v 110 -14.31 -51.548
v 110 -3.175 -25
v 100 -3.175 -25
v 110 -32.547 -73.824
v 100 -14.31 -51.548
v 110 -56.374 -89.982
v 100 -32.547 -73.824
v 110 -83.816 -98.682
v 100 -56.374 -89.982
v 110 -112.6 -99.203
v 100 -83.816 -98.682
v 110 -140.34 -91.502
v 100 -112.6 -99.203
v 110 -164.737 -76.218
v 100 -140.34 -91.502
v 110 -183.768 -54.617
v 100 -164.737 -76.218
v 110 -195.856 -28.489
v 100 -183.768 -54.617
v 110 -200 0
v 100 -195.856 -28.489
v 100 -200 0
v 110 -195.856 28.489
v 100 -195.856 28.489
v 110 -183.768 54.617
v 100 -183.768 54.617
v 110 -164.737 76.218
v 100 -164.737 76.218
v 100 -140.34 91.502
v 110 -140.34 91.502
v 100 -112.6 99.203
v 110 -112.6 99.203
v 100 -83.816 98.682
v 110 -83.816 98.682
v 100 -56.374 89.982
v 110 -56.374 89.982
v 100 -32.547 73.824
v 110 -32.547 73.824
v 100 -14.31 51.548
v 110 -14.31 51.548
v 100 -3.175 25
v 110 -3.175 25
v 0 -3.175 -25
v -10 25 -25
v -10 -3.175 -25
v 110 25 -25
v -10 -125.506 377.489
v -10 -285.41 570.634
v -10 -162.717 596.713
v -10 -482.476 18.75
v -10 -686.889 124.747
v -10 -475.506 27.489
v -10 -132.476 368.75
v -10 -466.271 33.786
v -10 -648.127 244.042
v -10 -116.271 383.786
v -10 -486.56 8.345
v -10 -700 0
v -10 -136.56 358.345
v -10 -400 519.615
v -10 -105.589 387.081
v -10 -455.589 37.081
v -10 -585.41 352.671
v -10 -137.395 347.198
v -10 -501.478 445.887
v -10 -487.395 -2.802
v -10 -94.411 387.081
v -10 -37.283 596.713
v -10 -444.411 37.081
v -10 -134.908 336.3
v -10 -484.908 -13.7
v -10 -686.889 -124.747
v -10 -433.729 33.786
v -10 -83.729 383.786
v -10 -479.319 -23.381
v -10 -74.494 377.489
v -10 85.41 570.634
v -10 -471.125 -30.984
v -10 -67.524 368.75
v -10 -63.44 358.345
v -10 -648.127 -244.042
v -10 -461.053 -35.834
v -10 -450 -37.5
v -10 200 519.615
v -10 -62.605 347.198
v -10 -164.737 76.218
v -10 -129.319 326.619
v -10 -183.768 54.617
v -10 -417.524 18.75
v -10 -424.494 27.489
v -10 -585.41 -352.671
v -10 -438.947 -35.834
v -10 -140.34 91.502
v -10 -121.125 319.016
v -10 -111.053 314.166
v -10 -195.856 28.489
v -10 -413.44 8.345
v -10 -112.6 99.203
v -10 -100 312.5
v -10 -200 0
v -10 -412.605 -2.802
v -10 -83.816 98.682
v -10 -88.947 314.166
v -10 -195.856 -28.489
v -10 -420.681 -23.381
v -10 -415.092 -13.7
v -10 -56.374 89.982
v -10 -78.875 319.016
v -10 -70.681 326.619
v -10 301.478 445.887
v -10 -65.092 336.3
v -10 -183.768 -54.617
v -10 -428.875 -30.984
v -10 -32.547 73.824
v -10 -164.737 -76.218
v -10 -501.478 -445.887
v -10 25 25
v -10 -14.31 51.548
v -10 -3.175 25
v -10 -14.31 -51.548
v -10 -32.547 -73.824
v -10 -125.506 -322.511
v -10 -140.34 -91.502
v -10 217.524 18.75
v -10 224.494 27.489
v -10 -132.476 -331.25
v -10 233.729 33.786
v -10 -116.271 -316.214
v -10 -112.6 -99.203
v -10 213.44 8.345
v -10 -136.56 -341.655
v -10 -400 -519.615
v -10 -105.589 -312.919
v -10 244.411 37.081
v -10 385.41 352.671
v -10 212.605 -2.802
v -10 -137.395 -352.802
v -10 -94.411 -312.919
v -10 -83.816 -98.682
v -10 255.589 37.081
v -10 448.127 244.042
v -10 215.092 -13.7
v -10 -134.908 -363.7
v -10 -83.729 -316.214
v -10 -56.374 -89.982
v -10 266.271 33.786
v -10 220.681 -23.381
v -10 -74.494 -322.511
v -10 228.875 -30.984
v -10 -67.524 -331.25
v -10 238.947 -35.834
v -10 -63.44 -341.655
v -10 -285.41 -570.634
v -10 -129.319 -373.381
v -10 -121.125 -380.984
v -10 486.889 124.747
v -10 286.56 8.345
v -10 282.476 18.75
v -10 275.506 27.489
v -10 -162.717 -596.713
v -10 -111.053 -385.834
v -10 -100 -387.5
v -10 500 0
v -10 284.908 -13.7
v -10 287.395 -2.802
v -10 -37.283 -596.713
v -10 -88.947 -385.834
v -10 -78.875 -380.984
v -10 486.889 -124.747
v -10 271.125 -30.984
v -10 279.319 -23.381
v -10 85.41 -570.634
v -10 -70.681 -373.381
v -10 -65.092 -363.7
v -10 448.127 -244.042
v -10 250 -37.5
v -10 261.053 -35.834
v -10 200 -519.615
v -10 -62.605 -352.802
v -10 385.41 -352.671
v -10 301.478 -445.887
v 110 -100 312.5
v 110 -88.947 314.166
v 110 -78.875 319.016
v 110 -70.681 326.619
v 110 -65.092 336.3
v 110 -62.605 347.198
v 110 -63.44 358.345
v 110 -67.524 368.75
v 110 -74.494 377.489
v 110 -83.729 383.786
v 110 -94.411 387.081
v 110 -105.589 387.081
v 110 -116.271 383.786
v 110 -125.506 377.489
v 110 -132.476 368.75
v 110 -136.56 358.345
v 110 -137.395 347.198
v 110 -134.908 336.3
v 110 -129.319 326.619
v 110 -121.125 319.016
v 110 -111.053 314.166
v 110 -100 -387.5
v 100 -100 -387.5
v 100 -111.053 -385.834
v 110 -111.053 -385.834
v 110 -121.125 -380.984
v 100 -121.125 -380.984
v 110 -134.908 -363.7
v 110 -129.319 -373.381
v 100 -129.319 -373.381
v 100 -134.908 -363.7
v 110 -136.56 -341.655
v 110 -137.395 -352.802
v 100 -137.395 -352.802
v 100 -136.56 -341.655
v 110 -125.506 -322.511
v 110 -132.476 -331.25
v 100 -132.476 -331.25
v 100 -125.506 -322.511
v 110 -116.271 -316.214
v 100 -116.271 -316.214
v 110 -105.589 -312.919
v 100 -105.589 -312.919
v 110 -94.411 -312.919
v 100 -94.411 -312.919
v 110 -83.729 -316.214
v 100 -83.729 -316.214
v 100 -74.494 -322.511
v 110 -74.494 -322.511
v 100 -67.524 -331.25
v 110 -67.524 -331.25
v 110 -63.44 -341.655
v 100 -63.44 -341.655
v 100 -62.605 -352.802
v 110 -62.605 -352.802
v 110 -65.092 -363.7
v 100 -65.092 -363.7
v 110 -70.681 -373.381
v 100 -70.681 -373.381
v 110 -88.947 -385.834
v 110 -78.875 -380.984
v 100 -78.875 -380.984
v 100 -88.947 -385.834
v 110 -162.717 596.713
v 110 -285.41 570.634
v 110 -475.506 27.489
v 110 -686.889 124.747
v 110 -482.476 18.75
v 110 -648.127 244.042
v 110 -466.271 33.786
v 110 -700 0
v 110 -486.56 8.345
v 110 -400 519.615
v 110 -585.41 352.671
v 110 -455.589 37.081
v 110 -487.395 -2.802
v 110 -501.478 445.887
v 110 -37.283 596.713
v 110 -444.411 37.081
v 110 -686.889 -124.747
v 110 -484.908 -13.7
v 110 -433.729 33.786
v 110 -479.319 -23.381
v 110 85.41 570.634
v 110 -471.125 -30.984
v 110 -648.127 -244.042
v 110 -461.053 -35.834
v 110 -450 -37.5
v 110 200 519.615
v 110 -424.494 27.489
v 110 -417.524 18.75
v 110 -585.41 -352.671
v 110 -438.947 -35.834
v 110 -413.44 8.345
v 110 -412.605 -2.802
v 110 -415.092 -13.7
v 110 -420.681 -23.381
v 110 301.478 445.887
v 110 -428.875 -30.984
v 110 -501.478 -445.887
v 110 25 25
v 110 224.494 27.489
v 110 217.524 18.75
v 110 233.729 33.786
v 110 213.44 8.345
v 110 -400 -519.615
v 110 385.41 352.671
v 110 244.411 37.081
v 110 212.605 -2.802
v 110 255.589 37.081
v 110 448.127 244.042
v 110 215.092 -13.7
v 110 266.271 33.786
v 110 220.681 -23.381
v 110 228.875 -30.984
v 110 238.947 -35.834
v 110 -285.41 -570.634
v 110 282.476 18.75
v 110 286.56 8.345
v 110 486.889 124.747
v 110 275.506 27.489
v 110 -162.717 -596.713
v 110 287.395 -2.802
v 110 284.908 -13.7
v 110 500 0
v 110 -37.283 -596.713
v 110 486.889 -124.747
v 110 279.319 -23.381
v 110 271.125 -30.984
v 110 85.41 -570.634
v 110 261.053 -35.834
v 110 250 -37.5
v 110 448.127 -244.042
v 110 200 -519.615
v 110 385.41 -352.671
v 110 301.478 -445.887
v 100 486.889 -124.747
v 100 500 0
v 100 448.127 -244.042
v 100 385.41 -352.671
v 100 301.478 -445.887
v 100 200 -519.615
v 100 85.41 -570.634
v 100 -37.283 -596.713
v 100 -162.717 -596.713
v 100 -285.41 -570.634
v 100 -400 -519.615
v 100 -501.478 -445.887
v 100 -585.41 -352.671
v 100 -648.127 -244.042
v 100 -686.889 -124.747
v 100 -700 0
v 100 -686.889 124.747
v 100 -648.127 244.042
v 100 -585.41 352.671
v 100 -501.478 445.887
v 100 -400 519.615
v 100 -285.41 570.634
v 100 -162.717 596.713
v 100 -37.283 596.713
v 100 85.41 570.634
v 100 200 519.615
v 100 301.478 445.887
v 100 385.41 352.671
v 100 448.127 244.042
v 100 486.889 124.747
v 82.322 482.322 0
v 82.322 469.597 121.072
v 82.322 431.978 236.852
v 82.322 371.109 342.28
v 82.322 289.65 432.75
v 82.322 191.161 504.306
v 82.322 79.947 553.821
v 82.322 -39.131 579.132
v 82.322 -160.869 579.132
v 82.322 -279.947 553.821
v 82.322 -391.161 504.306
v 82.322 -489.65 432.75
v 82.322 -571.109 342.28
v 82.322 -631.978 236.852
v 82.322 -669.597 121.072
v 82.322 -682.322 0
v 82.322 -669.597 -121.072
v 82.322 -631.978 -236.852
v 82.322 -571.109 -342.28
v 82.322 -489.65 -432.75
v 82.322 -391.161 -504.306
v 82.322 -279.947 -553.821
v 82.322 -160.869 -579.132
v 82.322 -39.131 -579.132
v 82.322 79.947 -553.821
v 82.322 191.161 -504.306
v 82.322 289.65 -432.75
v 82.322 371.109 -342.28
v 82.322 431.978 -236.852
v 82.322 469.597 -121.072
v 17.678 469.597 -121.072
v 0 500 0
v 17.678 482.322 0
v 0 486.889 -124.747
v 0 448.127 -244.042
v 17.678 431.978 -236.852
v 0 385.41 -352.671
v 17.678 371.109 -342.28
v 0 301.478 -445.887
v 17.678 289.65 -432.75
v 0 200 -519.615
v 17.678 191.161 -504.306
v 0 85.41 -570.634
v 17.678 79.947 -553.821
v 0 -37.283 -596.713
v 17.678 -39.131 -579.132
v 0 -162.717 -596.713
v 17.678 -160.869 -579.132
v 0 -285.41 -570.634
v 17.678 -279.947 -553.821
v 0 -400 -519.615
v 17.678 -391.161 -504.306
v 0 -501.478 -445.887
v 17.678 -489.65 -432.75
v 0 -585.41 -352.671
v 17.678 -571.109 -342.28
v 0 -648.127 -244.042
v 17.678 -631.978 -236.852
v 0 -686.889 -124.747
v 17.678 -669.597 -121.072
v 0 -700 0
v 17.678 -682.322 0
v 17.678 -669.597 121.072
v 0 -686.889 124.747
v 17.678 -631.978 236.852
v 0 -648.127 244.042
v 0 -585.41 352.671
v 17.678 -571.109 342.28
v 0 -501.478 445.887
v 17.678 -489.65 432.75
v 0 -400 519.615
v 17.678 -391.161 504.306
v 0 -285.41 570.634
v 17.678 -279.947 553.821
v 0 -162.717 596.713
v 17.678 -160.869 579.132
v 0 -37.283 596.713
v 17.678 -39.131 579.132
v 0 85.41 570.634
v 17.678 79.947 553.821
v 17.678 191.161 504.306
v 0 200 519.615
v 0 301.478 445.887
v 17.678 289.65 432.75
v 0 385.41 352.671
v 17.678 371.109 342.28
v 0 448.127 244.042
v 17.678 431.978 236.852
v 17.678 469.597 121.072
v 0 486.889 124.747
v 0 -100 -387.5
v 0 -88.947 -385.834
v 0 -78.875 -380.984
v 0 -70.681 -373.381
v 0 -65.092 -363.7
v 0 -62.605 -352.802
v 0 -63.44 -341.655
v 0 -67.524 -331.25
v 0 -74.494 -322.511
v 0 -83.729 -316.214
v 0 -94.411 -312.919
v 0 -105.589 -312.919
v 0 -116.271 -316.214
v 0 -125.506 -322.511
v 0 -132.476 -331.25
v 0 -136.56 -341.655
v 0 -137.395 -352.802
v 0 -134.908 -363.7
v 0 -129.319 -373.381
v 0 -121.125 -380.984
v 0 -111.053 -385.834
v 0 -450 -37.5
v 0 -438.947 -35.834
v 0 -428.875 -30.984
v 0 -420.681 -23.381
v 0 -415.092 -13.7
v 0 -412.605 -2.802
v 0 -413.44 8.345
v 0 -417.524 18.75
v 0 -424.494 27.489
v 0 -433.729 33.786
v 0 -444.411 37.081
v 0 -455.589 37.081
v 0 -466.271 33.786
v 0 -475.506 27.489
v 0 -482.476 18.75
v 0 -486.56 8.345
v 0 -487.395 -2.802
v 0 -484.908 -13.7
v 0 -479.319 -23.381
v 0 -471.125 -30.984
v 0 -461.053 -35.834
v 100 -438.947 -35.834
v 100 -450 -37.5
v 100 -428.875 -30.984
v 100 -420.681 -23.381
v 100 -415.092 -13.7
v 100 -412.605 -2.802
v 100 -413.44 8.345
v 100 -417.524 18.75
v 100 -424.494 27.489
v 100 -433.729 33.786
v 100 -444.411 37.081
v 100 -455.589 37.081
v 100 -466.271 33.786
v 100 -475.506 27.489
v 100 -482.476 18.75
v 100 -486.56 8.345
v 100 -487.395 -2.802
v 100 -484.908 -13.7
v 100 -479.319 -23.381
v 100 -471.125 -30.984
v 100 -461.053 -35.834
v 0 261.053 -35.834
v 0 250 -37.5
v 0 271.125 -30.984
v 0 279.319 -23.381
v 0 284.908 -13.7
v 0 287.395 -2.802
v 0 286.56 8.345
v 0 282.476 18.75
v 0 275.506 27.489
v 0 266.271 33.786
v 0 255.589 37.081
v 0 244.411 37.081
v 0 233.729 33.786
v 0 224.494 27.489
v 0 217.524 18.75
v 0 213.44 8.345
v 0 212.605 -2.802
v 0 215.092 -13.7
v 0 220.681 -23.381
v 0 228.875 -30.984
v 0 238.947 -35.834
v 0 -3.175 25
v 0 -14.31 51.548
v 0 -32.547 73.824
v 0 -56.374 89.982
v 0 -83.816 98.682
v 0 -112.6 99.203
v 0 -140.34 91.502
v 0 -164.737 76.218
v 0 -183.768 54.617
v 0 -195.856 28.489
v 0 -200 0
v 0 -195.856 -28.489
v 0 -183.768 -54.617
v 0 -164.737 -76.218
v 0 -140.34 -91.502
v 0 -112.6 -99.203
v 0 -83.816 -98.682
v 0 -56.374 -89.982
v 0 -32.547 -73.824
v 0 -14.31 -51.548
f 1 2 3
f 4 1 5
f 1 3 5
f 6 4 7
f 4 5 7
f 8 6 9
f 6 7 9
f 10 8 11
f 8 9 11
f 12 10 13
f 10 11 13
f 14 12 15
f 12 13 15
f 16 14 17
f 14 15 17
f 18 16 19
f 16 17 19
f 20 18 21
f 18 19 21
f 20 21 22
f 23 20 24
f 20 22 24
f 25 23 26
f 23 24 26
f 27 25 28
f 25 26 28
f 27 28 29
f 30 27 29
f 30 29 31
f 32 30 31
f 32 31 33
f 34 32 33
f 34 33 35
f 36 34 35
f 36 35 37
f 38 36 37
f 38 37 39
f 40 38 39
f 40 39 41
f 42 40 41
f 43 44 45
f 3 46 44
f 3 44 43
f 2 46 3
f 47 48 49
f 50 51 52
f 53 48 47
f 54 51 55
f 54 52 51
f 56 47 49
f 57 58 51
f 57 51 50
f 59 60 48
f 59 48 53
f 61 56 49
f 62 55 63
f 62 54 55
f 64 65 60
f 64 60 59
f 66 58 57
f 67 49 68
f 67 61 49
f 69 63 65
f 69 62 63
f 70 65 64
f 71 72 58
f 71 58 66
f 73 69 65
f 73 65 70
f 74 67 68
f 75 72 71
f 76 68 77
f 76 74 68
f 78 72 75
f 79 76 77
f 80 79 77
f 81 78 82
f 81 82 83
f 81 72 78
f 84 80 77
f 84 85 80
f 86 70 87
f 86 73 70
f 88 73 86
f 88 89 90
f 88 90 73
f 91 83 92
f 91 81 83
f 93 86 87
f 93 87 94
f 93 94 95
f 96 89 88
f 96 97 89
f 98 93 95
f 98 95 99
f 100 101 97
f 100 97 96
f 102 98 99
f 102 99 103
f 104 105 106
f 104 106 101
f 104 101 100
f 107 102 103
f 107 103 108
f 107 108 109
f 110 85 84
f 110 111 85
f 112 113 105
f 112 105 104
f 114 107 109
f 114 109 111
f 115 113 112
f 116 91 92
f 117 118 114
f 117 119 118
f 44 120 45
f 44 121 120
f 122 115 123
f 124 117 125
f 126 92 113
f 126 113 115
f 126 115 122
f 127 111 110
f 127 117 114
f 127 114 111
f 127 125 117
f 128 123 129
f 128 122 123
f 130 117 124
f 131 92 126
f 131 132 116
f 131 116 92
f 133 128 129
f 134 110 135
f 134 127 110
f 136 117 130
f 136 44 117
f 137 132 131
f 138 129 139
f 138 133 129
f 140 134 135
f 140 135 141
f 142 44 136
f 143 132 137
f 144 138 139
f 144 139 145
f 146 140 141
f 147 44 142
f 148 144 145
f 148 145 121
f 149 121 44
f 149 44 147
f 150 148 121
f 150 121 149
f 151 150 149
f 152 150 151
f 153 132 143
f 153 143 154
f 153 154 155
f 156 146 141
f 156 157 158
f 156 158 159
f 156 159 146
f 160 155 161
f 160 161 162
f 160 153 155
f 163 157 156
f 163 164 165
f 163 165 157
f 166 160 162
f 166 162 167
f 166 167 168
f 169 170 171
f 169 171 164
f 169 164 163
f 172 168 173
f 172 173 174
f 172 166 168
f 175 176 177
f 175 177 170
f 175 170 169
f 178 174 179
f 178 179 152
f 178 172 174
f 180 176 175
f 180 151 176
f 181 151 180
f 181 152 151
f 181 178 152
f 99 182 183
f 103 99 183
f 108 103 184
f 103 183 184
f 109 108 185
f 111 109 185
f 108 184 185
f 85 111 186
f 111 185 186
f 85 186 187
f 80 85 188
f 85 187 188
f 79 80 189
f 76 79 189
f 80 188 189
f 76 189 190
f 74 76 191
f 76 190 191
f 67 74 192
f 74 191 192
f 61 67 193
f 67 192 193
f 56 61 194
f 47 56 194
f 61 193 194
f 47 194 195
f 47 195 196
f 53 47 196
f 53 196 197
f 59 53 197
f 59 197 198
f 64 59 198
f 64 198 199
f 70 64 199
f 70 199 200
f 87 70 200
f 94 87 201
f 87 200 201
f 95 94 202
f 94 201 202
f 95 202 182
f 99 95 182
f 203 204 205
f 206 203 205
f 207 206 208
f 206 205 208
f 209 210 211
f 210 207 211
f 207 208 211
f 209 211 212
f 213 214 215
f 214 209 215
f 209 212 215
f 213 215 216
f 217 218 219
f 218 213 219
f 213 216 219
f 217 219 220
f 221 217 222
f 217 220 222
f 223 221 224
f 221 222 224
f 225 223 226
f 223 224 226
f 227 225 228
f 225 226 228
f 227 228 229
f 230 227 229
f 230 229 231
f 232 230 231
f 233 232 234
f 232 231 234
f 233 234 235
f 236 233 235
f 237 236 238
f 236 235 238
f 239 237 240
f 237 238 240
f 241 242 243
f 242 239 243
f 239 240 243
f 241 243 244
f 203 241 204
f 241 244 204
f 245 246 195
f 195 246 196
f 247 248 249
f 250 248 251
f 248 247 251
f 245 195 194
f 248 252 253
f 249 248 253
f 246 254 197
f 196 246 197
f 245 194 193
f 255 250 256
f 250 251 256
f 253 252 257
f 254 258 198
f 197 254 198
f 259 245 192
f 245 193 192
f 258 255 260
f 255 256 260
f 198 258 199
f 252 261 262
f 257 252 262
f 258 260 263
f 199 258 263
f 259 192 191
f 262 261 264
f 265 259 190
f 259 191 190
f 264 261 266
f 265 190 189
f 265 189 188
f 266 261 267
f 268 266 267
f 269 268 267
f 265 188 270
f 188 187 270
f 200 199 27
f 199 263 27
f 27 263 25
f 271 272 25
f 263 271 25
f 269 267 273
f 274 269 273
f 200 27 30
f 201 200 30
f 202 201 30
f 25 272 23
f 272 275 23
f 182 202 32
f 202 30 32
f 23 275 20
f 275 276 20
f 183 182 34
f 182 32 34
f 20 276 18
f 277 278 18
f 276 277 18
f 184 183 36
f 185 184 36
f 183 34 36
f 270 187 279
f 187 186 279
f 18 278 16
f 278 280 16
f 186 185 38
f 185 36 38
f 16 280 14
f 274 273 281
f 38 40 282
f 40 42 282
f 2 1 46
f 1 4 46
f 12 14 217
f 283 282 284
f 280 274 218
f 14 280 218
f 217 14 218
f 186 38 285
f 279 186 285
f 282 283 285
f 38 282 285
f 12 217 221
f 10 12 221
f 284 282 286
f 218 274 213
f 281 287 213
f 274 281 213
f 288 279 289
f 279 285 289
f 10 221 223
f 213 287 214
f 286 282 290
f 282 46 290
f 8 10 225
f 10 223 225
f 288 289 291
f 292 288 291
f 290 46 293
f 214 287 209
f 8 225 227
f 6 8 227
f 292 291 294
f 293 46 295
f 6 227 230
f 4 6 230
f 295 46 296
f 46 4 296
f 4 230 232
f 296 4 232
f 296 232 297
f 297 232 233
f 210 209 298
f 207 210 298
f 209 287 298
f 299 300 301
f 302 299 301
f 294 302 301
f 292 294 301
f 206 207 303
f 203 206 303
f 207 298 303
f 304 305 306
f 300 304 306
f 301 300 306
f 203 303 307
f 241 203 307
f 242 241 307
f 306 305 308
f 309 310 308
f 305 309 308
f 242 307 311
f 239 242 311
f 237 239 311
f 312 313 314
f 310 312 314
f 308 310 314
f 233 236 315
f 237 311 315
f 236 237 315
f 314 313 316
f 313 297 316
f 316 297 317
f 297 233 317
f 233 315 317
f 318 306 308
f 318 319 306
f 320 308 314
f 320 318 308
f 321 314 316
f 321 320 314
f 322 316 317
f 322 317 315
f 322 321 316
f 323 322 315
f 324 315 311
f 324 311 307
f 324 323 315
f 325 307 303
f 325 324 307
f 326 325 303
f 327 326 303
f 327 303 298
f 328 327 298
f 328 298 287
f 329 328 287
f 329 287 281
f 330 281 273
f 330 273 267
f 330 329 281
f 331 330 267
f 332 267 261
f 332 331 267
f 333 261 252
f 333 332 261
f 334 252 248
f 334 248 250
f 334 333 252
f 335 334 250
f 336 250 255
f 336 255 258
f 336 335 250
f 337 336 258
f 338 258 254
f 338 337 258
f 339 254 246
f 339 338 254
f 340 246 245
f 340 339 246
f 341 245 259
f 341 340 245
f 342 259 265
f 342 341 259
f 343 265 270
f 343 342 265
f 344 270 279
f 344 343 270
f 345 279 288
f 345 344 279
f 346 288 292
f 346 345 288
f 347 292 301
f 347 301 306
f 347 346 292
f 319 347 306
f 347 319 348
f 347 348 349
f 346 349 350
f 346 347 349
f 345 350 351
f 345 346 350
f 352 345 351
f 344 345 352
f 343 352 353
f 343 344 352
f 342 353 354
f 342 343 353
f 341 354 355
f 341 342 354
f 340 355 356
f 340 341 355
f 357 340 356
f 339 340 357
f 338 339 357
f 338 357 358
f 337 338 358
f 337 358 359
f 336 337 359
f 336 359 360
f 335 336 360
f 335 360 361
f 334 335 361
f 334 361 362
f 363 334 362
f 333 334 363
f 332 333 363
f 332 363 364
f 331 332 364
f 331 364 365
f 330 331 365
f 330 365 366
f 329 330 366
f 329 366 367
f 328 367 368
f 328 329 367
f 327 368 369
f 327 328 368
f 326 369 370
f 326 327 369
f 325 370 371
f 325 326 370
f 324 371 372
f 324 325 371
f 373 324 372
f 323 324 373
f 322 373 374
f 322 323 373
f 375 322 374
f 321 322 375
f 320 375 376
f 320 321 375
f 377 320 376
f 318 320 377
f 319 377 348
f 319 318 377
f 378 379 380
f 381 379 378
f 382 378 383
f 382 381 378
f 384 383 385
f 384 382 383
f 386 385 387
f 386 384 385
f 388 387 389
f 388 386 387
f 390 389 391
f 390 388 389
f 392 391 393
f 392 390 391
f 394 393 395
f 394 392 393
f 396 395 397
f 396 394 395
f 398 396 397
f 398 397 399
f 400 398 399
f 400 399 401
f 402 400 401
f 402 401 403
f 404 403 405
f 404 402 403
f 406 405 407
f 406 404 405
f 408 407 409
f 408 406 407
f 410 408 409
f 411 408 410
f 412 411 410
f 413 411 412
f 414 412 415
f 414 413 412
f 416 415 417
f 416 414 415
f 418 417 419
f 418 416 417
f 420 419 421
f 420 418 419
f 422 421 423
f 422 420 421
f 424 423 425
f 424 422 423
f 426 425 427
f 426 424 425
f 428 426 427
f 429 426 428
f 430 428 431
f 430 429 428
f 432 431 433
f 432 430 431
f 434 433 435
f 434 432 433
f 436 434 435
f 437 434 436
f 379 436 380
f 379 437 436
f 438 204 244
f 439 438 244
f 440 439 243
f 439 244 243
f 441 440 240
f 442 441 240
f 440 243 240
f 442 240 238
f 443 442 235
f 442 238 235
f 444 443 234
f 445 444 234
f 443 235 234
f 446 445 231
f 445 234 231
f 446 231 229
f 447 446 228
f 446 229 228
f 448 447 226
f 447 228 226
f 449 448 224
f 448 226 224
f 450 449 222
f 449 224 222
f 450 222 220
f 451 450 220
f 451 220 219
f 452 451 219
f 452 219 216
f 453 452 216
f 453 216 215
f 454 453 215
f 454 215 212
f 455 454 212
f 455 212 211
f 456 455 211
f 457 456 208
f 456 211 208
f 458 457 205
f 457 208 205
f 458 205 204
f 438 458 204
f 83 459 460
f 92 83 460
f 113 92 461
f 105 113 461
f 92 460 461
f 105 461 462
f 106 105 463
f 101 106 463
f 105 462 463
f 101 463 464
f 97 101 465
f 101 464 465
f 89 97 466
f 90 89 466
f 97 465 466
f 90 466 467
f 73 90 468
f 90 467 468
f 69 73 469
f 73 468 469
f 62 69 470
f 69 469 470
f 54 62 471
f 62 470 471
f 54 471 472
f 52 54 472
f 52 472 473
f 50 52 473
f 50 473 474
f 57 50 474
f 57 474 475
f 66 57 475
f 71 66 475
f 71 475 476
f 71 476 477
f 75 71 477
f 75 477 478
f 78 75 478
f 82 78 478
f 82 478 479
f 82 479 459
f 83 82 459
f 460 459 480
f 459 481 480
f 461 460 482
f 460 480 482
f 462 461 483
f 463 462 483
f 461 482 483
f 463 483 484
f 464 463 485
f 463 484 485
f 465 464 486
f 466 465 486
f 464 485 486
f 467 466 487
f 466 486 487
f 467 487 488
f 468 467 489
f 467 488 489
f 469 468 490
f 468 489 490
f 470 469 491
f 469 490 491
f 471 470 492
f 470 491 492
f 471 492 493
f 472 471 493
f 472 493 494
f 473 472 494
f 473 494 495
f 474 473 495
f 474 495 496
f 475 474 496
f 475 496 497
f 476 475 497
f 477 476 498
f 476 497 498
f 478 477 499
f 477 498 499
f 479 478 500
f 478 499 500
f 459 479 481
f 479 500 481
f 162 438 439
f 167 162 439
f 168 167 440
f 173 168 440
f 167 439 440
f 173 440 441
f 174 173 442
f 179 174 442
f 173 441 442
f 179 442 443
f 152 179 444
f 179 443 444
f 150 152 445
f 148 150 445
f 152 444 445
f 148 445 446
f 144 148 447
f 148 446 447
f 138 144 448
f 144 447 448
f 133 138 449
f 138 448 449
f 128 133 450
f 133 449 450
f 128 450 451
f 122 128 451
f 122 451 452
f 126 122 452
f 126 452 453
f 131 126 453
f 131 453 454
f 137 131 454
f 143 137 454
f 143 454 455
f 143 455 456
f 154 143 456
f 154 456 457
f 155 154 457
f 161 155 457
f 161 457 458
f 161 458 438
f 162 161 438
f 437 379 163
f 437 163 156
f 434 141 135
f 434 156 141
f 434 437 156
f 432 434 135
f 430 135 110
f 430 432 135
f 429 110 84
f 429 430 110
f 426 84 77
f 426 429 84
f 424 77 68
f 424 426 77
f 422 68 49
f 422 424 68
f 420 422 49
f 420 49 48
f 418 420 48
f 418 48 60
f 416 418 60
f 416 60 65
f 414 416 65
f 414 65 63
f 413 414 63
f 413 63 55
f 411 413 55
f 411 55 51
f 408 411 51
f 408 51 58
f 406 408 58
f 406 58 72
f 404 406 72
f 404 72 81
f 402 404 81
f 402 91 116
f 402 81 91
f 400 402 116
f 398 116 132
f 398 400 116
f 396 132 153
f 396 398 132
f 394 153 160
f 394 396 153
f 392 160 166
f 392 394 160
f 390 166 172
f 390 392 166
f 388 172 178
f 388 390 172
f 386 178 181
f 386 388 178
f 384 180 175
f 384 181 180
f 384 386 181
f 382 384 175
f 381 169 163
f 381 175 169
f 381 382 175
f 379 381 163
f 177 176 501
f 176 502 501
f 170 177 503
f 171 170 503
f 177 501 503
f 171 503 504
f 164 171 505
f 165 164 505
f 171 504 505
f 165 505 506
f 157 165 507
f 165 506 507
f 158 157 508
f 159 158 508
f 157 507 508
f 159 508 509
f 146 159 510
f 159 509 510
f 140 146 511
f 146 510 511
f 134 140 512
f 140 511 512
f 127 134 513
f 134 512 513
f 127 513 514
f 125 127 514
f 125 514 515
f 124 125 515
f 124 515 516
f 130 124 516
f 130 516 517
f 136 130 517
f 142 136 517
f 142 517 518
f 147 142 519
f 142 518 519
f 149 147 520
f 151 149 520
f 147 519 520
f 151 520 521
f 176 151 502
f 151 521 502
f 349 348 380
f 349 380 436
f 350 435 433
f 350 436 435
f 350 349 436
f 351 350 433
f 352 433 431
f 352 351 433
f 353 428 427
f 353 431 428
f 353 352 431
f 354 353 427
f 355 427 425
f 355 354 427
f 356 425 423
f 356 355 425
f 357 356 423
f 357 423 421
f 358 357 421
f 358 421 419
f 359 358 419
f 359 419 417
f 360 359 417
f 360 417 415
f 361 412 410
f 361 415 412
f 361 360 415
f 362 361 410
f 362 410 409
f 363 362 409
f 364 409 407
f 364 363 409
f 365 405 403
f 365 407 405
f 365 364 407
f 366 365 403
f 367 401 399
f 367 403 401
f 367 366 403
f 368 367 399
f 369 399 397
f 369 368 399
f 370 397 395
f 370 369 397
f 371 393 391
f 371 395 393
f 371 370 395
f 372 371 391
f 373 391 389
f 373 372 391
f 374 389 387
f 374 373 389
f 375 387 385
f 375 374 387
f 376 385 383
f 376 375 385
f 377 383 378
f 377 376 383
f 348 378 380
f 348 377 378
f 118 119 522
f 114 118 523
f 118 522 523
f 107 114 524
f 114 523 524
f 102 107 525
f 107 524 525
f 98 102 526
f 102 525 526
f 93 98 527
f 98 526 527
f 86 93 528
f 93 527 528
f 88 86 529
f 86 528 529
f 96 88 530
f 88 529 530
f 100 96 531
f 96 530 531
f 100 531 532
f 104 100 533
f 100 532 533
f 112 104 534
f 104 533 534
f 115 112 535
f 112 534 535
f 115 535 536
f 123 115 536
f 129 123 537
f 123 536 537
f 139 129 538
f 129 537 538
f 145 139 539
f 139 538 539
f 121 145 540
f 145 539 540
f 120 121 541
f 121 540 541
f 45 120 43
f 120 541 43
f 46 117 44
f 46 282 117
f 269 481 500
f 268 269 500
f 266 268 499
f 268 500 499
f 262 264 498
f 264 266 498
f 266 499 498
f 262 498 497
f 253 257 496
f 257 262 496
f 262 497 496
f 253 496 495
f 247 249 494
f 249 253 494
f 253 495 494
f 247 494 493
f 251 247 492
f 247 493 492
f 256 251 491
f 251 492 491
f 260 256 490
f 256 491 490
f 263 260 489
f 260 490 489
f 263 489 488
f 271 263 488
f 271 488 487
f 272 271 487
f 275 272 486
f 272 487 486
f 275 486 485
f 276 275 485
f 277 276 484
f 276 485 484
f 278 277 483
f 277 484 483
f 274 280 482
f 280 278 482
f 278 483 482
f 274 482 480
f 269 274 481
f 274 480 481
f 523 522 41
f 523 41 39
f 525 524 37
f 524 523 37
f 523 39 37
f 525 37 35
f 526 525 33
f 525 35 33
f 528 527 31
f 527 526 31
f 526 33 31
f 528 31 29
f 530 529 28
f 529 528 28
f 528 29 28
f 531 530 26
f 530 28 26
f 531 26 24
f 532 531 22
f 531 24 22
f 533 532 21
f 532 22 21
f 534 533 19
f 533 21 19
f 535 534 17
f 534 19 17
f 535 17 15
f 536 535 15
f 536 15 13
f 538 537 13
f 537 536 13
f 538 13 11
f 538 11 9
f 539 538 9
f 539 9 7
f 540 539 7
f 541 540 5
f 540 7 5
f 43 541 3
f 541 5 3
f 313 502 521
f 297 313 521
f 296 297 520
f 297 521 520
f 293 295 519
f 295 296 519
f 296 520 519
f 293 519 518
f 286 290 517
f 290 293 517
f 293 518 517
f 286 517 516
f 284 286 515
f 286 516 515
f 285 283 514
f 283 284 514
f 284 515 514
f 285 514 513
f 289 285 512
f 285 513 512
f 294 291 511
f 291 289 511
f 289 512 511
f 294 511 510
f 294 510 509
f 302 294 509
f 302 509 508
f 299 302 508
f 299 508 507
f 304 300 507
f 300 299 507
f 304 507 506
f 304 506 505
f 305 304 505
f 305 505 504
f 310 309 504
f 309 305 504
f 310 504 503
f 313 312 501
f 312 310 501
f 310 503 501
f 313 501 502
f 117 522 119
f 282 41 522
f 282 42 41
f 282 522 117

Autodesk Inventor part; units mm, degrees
ref_plane "YZ Plane" through (0, 0, 0) normal (1, 0, 0) x (0, 1, 0)
ref_plane "XZ Plane" through (0, 0, 0) normal (0, 1, 0) x (-1, 0, 0)
ref_plane "XY Plane" through (0, 0, 0) normal (0, 0, 1) x (1, 0, 0)
sketch "Sketch1" plane through (0, 0, 0) normal (0, 0, 1) x (1, 0, 0)
  line L0 (0, 0) -> (100, 0)
  line L1 (100, 0) -> (100, 500)
  line L2 (0, 500) -> (0, 0)
  line L3 (0, 500) -> (17.6777, 482.3223)
  line L4 (100, 500) -> (82.3223, 482.3223)
  line L5 (17.6777, 482.3223) -> (82.3223, 482.3223)
  line L6 (50, -100) -> (-150, -100)
revolve "Revolution1" add sketch "Sketch1" angle 360 about axis through (50, -100, 0) along (-1, 0, 0)
sketch "Sketch2" plane through (100, -100, 0) normal (1, 0, 0) x (0, 0, -1)
  circle A0 centre (0, 0) radius 600 projected
  circle A1 centre (0, 350) radius 37.5
  circle A2 centre (0, 0) radius 100 projected
  circle A3 centre (-350, 0) radius 37.5
  circle A4 centre (0, -350) radius 37.5
  circle A5 centre (350, 0) radius 37.5
  point P0 (0, 100)
  dimension "d8" = 360
extrude "Extrusion1" cut sketch "Sketch2" against normal blind 100 contours A1 | A3 | A4 | A5
thicken "Thicken1" operation add thickness 10 both sides no extend neighbours no toward (1, 0, 0) faces at (100, -364.9419, 262.9039)
thicken "Thicken2" operation add thickness 10 both sides no extend neighbours no toward (-1, 0, 0) faces at (0, -364.9419, 262.9039)
sketch "Sketch3" plane through (110, -100, 0) normal (1, 0, 0) x (0, 0, -1)
  line L0 (-25, 125) -> (25, 125)
  line L1 (25, 125) -> (25, 96.8246)
  line L2 (-25, 96.8246) -> (-25, 125)
  line L3 (-25, 125) -> (0, 100) construction
  line L4 (25, 125) -> (0, 100) construction
  arc A0 (25, 96.8246) -> (-25, 96.8246) centre (0, 0) ccw
  point P0 (0, 100)
extrude "Extrusion2" cut sketch "Sketch3" against normal blind 120
properties part number "Polea-1021920"
